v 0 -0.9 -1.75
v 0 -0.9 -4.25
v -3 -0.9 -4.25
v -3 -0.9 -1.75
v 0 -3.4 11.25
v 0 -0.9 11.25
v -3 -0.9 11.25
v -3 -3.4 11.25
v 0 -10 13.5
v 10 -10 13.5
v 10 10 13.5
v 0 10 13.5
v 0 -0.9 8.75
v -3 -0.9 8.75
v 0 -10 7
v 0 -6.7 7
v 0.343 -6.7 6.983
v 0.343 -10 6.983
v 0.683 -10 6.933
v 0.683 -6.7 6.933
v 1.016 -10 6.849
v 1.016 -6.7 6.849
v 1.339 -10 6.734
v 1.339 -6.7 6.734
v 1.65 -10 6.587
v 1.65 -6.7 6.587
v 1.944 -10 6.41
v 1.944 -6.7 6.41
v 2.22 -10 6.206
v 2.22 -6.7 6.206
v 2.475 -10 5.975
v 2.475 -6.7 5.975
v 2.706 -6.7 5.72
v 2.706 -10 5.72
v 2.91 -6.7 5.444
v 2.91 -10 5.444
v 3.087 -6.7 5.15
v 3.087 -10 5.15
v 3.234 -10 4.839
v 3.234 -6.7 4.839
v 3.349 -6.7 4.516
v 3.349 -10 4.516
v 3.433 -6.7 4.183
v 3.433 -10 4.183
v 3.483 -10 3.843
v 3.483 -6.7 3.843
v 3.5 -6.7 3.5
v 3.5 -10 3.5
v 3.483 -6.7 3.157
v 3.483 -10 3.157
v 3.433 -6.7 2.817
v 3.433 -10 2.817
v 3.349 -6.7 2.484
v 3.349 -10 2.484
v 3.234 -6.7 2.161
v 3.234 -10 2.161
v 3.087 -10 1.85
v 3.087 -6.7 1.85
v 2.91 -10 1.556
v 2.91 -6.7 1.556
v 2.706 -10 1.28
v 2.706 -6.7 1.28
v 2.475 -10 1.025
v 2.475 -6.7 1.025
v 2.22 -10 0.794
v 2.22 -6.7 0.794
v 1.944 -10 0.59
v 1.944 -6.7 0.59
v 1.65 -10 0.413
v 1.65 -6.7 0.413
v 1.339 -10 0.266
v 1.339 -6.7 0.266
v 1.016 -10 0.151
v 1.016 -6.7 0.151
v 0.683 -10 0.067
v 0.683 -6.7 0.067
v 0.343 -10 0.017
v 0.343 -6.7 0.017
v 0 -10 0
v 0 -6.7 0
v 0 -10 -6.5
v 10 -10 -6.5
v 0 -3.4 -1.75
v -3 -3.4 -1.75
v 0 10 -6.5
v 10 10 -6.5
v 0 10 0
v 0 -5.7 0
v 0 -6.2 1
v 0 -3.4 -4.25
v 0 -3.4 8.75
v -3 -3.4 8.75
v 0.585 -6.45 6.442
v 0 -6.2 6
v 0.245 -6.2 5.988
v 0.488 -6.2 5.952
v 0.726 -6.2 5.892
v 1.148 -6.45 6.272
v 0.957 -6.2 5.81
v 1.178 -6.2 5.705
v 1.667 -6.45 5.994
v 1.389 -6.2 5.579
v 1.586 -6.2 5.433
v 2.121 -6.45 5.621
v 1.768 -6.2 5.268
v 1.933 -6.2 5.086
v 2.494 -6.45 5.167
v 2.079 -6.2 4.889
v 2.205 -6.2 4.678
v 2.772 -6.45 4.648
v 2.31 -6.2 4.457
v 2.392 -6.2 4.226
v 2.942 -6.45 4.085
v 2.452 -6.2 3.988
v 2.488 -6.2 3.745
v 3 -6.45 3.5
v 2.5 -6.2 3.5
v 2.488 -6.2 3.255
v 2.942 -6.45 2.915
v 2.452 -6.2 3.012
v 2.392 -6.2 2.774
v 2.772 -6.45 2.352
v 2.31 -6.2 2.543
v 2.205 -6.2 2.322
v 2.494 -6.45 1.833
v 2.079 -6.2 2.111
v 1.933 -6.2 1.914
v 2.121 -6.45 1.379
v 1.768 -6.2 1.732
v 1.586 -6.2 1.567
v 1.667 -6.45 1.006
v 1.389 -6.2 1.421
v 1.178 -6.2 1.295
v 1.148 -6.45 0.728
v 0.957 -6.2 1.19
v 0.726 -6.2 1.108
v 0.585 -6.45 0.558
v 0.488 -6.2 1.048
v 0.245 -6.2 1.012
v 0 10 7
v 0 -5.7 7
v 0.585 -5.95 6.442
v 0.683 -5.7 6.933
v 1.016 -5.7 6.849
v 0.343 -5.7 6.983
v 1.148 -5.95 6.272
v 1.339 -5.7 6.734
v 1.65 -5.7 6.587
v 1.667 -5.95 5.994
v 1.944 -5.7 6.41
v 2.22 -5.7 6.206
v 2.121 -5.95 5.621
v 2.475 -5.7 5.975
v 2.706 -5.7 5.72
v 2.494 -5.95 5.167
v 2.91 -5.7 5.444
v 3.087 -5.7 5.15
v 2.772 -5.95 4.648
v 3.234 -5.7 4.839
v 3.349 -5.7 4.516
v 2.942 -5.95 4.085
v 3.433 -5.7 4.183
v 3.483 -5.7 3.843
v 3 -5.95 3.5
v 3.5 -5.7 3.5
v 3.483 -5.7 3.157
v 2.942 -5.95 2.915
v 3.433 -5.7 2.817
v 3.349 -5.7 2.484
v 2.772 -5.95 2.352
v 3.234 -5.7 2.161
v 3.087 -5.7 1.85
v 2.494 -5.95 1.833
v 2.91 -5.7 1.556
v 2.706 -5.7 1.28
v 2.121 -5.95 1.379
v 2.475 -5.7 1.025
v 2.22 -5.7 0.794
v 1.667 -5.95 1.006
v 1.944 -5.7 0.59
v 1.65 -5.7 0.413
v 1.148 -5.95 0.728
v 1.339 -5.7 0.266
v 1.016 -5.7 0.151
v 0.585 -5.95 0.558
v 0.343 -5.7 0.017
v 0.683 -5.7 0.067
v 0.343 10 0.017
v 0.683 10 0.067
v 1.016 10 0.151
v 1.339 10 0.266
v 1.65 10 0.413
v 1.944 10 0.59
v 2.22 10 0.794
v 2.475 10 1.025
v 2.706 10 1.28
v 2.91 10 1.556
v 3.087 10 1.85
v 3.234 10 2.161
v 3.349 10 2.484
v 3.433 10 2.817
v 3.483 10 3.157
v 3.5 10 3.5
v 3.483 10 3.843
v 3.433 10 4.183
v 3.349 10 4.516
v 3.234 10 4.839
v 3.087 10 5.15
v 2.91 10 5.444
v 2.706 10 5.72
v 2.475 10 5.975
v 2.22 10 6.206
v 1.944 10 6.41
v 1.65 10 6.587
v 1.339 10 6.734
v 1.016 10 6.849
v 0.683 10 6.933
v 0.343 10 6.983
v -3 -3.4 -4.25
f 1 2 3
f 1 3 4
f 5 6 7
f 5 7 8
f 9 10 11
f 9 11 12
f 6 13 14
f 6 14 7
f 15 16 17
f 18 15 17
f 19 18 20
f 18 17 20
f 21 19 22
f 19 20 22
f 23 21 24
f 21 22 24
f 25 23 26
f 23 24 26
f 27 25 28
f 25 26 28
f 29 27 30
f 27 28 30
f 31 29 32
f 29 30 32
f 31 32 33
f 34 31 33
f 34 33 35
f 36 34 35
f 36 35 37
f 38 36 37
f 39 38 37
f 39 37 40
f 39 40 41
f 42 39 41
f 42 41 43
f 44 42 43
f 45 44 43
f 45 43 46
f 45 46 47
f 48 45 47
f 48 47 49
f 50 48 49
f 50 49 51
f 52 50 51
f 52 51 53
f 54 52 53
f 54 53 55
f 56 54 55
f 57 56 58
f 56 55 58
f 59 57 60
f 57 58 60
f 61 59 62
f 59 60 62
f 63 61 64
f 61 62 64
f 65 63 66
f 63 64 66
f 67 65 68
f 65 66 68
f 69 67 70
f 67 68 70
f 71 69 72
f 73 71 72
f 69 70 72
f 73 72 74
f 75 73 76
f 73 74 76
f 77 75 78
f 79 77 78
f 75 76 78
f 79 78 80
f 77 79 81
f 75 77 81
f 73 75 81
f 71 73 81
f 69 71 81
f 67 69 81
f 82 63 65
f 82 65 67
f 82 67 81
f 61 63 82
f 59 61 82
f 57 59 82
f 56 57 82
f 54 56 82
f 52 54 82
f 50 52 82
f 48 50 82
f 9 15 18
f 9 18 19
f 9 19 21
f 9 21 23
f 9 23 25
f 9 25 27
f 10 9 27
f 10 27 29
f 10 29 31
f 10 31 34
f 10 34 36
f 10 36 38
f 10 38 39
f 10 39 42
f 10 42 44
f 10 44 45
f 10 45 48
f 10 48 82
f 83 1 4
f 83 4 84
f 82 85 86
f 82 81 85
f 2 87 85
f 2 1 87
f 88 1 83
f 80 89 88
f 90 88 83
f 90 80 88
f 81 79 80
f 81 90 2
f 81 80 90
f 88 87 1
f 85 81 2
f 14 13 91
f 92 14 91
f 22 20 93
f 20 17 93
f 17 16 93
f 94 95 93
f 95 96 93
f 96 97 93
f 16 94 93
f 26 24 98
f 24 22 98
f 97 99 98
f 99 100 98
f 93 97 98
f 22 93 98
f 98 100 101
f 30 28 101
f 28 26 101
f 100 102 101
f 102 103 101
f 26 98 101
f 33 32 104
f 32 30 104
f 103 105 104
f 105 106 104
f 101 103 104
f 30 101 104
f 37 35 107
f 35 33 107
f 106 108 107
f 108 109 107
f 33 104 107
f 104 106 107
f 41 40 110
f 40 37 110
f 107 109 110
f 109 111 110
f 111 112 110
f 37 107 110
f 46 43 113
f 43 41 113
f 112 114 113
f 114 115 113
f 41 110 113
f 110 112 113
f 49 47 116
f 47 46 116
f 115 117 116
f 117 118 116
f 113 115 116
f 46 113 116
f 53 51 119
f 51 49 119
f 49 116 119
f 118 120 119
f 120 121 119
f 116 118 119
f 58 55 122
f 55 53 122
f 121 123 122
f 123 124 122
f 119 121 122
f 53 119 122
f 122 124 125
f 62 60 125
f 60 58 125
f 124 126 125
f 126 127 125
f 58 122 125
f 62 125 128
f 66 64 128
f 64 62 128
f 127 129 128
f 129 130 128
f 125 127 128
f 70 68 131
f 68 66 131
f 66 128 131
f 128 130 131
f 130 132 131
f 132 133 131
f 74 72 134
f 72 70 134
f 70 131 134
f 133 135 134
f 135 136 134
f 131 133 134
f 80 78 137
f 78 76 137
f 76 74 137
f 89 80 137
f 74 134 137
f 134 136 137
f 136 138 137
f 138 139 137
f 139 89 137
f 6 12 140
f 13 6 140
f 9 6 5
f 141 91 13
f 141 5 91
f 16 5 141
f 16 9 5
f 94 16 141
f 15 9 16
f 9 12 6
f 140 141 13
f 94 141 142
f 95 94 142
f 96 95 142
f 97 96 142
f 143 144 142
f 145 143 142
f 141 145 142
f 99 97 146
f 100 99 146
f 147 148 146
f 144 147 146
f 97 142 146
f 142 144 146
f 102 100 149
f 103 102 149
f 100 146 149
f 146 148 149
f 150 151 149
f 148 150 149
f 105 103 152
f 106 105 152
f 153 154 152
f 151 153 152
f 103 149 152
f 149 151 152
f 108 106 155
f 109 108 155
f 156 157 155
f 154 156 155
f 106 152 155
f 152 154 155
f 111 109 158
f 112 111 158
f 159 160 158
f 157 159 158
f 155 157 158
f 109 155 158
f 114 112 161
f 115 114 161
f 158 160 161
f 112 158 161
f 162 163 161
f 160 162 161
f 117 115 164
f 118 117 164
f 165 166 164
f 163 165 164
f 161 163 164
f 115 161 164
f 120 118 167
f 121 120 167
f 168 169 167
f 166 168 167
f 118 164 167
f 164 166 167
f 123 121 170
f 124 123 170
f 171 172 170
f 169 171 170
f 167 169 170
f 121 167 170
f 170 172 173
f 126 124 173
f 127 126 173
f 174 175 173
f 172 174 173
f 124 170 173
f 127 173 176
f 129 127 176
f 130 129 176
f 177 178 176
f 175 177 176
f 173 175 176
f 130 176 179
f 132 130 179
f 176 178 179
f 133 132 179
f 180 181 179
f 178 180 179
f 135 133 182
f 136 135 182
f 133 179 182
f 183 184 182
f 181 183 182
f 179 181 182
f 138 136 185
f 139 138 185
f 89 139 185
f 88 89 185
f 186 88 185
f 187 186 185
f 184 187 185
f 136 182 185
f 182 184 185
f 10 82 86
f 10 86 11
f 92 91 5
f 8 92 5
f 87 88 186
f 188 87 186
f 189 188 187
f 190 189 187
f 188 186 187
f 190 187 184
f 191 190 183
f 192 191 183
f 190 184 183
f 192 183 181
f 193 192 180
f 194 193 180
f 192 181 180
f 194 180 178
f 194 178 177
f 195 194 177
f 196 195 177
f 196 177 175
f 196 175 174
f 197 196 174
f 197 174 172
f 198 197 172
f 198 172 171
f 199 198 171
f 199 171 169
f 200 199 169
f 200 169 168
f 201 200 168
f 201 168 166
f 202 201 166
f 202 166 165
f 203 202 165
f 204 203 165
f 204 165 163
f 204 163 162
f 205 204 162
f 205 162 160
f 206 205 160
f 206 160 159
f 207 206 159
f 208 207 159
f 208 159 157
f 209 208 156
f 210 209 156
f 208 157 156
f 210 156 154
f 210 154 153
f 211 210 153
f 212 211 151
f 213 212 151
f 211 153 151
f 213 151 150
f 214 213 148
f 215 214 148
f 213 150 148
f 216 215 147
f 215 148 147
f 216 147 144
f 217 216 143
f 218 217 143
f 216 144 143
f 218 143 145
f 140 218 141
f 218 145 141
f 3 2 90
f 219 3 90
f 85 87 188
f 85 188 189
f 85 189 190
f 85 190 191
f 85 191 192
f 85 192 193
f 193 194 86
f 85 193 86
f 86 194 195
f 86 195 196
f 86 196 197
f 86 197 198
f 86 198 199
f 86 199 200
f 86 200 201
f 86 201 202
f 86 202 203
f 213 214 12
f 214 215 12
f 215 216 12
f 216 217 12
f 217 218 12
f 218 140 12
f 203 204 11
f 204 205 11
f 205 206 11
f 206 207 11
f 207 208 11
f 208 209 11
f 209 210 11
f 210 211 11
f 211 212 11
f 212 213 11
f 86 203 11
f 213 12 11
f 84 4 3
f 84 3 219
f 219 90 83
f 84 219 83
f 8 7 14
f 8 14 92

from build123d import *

# Parameters (mm, degrees)
F1_DEPTH  = 10
F3_DEPTH  = 6.7
F5_DEPTH  = 5.7
F8_W      = 2.5
F8_H      = 2.5
F10_DEPTH = 3
F9_W      = 2.5
F9_H      = 2.5
F11_DEPTH = 3
F13_DEPTH = 10
F14_DEPTH = 11


with BuildPart() as f1:
    # F0 (on Front) → F1 (new body)
    with BuildSketch(Plane.XZ):
        with BuildLine():
            ThreePointArc((0, 7), (3.5, 3.5), (0, 0))
            Line((0, 0), (0, -6.5))
            Line((0, -6.5), (10, -6.5))
            Line((10, -6.5), (10, 13.5))
            Line((10, 13.5), (0, 13.5))
            Line((0, 13.5), (0, 7))
        make_face()
    extrude(amount=F1_DEPTH)

    # F2 (on Front) → F3 (join)
    with BuildSketch(Plane.XZ):
        with BuildLine():
            ThreePointArc((0, 6), (2.5, 3.5), (0, 1))
            Line((0, 1), (0, 0))
            ThreePointArc((0, 0), (3.5, 3.5), (0, 7))
            Line((0, 7), (0, 6))
        make_face()
    extrude(amount=F3_DEPTH)

    # F4 (on Front) → F5 (cut)
    with BuildSketch(Plane.XZ):
        with BuildLine():
            Line((0, 1), (0, 0))
            ThreePointArc((0, 0), (3.5, 3.5), (0, 7))
            Line((0, 7), (0, 6))
            ThreePointArc((0, 6), (2.5, 3.5), (0, 1))
        make_face()
    extrude(amount=F5_DEPTH, mode=Mode.SUBTRACT)

    # F6 (on face) → F7 (revolve, cut)
    with BuildSketch(Plane(origin=(0, 0, 0), x_dir=(0, -1, 0), z_dir=(-1, 0, 0))):
        Polygon((6.2, 6), (5.7, 7), (5.7, 6), align=None)
        Polygon((6.7, 7), (6.2, 6), (6.7, 6), align=None)
    revolve(axis=Axis((0, 0, 3.5), (0, 1, 0)), mode=Mode.SUBTRACT)

    # F8 (on face) → F10 (join)
    with BuildSketch(Plane(origin=(0, 0, 0), x_dir=(0, -1, 0), z_dir=(-1, 0, 0))):
        with Locations((2.15, 10)):
            Rectangle(F8_W, F8_H)
    extrude(amount=F10_DEPTH)

    # F9 (on face) → F11 (join)
    with BuildSketch(Plane(origin=(0, 0, 0), x_dir=(0, -1, 0), z_dir=(-1, 0, 0))):
        with Locations((2.15, -3)):
            Rectangle(F9_W, F9_H)
    extrude(amount=F11_DEPTH)

    # F0 (on Front) → F13 (join)
    with BuildSketch(Plane.XZ):
        with BuildLine():
            Line((0, 7), (0, 0))
            ThreePointArc((0, 0), (3.5, 3.5), (0, 7))
        make_face()
        with BuildLine():
            ThreePointArc((0, 7), (3.5, 3.5), (0, 0))
            Line((0, 0), (0, -6.5))
            Line((0, -6.5), (10, -6.5))
            Line((10, -6.5), (10, 13.5))
            Line((10, 13.5), (0, 13.5))
            Line((0, 13.5), (0, 7))
        make_face()
    extrude(amount=-F13_DEPTH)

    # F14 (cut): a face of the model
    f14_faces = [f1.faces().sort_by_distance(p)[0] for p in [
        (1.4854461355, 0, 3.5),
    ]]
    extrude(f14_faces, amount=-F14_DEPTH, mode=Mode.SUBTRACT)


solid = f1.part
